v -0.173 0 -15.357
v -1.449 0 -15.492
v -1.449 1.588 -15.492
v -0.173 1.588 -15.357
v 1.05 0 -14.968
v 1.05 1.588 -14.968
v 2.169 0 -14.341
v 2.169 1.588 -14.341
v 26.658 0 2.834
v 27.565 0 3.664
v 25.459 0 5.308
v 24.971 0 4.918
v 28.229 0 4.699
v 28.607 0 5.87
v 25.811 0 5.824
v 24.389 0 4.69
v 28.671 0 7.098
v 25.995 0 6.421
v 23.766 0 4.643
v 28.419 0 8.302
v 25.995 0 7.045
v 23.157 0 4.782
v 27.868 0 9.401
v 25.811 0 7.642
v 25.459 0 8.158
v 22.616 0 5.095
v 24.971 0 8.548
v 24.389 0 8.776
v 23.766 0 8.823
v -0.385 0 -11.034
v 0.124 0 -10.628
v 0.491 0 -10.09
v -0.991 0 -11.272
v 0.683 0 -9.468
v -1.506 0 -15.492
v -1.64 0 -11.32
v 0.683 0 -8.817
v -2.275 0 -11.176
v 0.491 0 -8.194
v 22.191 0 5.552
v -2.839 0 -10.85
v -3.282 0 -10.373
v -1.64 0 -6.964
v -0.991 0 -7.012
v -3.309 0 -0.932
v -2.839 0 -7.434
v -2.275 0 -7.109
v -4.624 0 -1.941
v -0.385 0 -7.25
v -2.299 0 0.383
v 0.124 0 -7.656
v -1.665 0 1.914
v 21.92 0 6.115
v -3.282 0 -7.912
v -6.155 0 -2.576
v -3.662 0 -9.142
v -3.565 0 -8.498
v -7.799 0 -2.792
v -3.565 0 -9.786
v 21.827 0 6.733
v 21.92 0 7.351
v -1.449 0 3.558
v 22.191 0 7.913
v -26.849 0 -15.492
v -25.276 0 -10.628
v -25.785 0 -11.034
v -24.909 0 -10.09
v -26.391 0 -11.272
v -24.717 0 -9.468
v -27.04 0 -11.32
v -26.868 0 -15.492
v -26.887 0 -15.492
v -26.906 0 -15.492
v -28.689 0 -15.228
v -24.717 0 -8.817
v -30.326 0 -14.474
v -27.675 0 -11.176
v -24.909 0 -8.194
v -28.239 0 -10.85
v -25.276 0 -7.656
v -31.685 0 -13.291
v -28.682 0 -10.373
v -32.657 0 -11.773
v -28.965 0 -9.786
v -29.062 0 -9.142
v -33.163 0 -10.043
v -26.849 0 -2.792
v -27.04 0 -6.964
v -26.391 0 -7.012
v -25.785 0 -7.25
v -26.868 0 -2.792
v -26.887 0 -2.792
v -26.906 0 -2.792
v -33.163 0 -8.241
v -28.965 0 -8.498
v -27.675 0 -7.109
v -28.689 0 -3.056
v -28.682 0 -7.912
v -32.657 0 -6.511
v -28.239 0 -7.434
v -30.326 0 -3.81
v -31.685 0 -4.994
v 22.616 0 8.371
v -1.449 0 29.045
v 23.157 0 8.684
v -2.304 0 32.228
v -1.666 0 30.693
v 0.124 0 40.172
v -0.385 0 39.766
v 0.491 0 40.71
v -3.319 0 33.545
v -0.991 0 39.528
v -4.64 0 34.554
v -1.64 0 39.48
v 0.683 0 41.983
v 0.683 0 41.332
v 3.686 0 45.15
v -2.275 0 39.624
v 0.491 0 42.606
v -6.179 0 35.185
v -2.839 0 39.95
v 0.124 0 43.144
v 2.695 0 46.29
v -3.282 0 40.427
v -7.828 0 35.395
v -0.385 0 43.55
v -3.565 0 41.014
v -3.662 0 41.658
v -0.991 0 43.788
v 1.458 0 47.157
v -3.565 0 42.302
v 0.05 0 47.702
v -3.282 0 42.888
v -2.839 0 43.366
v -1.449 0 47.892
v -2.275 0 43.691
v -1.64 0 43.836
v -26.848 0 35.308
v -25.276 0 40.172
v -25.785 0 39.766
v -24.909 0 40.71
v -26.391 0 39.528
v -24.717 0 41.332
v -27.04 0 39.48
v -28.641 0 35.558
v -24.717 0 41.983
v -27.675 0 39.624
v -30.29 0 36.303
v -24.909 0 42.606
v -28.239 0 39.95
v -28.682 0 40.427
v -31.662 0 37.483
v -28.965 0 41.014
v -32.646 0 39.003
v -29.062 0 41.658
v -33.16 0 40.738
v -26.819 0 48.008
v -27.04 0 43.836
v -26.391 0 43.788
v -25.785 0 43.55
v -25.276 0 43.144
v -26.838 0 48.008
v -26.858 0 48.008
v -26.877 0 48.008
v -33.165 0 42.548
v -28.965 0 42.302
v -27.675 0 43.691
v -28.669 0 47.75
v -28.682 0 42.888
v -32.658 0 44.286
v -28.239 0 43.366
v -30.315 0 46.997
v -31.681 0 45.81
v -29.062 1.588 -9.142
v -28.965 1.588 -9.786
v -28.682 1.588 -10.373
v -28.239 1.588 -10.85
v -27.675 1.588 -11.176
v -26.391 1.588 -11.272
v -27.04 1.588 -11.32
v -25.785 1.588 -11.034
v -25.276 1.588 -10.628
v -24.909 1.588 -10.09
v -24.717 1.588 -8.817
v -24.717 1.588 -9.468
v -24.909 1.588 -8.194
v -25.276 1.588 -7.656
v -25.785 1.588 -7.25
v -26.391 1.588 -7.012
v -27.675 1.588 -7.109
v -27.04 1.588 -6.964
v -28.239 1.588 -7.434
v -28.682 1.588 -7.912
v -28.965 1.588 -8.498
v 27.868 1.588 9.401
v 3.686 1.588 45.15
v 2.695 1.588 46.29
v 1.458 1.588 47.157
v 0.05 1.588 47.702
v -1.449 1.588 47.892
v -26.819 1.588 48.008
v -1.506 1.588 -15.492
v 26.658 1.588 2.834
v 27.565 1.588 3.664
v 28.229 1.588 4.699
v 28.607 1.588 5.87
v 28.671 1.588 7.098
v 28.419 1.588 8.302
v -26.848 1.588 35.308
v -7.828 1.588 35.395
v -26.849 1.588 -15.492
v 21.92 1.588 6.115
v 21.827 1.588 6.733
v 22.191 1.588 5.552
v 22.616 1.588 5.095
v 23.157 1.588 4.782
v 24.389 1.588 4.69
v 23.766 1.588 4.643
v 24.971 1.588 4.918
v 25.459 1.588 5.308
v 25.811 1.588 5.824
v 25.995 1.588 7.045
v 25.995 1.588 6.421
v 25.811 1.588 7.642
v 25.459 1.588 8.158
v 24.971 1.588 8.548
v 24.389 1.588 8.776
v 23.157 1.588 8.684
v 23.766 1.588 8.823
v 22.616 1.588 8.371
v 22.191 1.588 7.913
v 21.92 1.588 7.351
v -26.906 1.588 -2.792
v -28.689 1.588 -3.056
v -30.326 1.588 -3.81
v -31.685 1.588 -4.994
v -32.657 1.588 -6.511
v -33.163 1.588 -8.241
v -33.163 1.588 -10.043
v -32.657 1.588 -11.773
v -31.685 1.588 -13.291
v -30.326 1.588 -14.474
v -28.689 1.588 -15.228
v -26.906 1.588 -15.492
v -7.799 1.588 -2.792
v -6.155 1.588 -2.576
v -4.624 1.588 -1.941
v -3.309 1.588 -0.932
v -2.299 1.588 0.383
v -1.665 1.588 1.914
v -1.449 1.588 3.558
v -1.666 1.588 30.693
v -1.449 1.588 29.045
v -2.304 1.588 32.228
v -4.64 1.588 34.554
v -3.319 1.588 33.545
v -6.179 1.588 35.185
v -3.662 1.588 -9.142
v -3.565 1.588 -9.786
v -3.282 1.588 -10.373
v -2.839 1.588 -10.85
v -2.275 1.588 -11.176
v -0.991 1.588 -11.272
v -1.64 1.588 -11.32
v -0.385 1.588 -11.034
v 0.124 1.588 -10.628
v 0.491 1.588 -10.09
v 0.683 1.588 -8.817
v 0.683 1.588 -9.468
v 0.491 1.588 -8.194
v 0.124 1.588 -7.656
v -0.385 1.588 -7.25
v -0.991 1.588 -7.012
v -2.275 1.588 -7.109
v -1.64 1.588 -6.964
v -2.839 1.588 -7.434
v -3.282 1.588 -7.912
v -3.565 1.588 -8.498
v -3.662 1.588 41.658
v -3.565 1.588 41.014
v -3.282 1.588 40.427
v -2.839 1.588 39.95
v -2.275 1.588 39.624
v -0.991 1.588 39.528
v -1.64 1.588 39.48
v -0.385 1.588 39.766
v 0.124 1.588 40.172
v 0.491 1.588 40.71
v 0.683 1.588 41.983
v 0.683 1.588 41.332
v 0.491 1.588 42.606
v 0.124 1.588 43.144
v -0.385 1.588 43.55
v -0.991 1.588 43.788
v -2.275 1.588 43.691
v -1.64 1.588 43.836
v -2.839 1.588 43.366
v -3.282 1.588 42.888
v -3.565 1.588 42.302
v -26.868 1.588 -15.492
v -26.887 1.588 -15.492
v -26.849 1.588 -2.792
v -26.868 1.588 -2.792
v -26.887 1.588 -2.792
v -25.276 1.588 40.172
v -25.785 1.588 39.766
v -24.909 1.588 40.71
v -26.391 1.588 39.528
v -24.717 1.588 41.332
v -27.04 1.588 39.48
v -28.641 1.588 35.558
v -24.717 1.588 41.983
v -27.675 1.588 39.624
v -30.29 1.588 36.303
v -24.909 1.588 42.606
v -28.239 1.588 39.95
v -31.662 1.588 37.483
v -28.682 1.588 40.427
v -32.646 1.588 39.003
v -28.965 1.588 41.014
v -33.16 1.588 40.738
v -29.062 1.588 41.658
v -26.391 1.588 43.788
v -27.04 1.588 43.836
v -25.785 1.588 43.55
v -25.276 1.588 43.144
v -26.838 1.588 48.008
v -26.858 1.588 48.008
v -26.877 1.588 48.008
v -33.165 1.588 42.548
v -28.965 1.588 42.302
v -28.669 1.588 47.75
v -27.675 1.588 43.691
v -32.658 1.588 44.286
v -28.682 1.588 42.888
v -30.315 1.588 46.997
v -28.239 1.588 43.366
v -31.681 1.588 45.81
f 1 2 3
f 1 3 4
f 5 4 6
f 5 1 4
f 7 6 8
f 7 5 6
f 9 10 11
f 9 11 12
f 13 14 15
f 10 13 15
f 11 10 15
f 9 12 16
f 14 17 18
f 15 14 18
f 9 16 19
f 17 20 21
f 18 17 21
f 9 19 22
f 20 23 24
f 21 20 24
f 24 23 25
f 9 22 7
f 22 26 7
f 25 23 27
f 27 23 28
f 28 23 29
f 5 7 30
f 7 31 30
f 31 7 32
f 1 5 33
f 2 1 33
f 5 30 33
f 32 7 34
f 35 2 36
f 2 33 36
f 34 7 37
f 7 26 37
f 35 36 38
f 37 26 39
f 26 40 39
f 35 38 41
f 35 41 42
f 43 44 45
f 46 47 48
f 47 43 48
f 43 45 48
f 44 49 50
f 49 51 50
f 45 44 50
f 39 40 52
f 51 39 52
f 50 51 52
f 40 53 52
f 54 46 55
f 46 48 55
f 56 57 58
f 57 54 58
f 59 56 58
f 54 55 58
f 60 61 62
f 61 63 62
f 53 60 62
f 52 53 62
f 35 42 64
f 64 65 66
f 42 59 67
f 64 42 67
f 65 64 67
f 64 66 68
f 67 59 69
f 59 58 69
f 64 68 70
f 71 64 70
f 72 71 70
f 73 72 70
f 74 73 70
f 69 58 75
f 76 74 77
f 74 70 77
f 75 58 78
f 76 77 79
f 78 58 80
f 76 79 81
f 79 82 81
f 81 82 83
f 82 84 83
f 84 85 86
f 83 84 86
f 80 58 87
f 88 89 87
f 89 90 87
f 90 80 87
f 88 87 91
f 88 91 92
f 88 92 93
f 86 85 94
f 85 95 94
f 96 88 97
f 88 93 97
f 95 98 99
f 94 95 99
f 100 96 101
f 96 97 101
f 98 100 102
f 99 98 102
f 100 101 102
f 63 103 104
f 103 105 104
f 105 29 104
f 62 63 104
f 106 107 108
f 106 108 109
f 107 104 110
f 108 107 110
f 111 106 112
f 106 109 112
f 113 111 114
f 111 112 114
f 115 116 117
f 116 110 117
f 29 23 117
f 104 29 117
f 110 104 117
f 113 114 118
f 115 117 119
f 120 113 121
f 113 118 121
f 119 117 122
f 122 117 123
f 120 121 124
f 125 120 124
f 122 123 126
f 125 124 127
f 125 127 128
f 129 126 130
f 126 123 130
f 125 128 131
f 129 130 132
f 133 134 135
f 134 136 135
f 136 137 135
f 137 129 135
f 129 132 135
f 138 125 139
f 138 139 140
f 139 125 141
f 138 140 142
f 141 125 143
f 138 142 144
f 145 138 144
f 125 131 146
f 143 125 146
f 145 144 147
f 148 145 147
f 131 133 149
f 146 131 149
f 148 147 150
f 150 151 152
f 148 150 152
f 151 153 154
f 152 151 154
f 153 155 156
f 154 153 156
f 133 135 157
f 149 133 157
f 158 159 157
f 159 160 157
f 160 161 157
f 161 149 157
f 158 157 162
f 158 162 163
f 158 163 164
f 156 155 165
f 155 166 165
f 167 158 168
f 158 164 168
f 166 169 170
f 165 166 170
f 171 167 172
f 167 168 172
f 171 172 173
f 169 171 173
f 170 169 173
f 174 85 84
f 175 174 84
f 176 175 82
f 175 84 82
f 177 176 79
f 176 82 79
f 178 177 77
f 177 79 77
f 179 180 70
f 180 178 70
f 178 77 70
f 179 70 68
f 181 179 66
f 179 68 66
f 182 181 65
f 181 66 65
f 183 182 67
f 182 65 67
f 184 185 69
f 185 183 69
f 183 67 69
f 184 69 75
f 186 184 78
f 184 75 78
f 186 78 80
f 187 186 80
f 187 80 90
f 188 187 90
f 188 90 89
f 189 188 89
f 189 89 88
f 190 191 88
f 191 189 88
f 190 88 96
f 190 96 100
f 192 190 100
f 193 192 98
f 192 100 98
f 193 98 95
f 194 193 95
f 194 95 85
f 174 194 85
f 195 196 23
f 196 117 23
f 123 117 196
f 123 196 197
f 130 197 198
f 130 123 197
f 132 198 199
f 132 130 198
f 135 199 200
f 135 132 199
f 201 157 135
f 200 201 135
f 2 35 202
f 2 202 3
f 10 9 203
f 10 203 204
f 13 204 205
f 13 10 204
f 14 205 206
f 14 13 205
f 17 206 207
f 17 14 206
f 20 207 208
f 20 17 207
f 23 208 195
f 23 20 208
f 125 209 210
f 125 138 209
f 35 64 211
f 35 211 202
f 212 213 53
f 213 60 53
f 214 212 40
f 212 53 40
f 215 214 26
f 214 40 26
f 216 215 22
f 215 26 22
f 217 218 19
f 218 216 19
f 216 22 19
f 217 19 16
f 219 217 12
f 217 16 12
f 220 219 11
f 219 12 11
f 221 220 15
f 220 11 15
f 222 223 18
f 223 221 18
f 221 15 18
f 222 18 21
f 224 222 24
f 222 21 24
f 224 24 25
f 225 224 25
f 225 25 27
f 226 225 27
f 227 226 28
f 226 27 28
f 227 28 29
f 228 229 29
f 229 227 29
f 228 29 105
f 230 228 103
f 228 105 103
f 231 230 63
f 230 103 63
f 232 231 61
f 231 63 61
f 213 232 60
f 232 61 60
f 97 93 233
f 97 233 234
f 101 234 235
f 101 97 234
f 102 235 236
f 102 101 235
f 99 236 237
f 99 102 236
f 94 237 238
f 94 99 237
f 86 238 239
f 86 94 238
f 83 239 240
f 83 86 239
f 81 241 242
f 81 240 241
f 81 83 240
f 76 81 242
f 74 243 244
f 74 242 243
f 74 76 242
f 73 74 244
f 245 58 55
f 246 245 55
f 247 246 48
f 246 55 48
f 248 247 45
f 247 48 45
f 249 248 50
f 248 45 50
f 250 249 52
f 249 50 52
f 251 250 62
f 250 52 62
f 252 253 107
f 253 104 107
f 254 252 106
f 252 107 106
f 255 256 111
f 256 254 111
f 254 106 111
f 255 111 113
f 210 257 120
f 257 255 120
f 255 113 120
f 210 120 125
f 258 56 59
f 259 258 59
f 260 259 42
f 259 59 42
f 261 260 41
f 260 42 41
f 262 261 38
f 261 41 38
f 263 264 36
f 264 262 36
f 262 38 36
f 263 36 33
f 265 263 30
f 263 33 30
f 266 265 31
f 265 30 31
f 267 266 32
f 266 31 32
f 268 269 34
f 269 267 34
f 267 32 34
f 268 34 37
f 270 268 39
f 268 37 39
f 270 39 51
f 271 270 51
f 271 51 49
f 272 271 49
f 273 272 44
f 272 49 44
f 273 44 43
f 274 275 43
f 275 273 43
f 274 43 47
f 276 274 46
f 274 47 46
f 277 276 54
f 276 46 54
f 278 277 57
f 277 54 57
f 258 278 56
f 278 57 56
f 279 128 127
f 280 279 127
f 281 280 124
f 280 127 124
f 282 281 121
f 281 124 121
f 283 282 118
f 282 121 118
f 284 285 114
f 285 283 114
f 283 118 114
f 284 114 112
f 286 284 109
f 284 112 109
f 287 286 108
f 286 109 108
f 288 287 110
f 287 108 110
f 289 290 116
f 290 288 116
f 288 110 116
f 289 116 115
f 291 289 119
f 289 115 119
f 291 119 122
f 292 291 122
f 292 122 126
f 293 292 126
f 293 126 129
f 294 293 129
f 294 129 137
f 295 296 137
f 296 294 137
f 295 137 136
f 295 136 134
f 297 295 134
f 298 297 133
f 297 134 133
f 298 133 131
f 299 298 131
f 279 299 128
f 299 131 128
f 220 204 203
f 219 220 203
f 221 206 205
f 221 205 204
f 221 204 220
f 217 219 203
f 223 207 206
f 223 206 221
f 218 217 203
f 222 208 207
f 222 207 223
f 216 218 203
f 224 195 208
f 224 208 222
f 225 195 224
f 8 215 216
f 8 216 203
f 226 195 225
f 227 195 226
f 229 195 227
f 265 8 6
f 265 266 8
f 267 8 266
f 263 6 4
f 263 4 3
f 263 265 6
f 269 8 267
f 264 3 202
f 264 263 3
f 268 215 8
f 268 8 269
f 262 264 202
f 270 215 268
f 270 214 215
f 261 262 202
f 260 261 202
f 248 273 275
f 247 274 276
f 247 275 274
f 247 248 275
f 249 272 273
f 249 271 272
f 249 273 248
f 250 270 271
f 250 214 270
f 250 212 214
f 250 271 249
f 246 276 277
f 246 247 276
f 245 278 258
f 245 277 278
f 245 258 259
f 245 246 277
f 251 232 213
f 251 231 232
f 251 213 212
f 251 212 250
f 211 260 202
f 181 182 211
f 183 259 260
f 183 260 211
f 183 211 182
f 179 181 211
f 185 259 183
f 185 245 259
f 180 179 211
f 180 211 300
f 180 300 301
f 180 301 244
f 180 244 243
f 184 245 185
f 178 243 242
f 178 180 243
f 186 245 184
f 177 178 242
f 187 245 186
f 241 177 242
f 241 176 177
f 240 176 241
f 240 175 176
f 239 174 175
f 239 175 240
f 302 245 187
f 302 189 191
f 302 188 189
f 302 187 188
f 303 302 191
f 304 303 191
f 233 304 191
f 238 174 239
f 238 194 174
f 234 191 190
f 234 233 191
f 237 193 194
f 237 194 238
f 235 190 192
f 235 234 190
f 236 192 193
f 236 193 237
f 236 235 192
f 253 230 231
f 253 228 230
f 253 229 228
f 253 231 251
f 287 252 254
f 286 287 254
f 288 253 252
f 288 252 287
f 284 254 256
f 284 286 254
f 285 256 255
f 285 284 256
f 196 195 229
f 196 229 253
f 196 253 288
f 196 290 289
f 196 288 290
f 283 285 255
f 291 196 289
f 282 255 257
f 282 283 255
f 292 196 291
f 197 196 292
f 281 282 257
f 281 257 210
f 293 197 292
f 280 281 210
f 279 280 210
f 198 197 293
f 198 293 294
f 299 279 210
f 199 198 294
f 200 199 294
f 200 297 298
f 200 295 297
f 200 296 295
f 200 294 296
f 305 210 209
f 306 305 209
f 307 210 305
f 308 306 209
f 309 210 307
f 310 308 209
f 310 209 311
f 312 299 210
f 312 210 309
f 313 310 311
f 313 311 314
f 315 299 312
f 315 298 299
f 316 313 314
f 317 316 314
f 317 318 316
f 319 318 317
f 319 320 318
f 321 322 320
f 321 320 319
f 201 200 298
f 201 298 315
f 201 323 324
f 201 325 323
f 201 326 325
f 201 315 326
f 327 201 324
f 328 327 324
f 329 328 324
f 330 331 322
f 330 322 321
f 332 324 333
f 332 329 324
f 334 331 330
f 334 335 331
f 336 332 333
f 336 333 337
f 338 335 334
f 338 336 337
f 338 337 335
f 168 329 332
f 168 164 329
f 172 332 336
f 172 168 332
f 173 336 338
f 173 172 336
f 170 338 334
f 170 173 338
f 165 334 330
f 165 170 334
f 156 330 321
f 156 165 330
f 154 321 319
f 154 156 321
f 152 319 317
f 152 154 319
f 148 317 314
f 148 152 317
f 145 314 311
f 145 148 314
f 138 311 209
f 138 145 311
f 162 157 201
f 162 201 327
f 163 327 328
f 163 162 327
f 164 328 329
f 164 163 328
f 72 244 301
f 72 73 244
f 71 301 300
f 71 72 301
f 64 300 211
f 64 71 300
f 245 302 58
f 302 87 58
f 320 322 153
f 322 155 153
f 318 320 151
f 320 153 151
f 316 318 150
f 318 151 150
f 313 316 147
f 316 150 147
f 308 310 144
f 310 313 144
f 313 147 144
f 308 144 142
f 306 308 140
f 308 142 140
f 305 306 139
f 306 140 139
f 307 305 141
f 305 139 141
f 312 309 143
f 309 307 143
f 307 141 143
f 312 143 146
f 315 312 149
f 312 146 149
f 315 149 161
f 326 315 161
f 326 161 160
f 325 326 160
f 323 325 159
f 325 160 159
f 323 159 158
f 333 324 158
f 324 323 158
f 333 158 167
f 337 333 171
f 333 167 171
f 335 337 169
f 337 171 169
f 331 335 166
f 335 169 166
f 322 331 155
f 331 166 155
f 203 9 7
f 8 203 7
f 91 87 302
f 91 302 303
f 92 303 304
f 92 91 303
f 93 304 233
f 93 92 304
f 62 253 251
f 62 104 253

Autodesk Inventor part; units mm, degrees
ref_plane "YZ Plane" through (0, 0, 0) normal (1, 0, 0) x (0, 1, 0)
ref_plane "XZ Plane" through (0, 0, 0) normal (0, 1, 0) x (-1, 0, 0)
ref_plane "XY Plane" through (0, 0, 0) normal (0, 0, 1) x (1, 0, 0)
sketch "Sketch1" plane through (0, 0, 0) normal (0, 1, 0) x (-1, 0, 0)
  circle A0 centre (1.4772, 41.6579) radius 2.1844
  circle A1 centre (26.8772, 41.6579) radius 2.1844
  circle A2 centre (26.8772, -9.1421) radius 2.1844
  circle A3 centre (1.4772, -9.1421) radius 2.1844
  arc A4 (1.4487, 47.8916) -> (-3.6864, 45.1505) centre (1.4772, 41.6579) ccw
  arc A5 (26.8481, 35.3079) -> (26.8191, 48.0076) centre (26.8772, 41.6579) ccw
  arc A6 (26.8487, -15.4921) -> (26.8487, -2.7922) centre (26.8772, -9.1421) ccw
  circle A7 centre (-23.9228, 6.7329) radius 2.0955
  arc A8 (-27.8677, 9.4012) -> (-26.6575, 2.8337) centre (-23.9228, 6.7329) ccw
  line L0 (-3.6864, 45.1505) -> (-27.8677, 9.4012)
  line L1 (-26.6575, 2.8337) -> (-2.169, -14.341)
  line L2 (26.8772, 48.0079) -> (1.4487, 47.8916)
  line L3 (26.8481, 35.3079) -> (7.8277, 35.3949)
  line L4 (1.4487, 29.045) -> (1.4487, 3.5578)
  line L5 (26.9057, -2.7922) -> (7.7987, -2.7922)
  line L6 (26.9057, -15.4921) -> (1.4487, -15.4921)
  arc A9 (1.5057, -2.7922) -> (1.4487, -2.7922) centre (1.4772, -9.1421) ccw
  arc A10 (-2.169, -14.341) -> (1.5057, -15.4921) centre (1.4772, -9.1421) ccw
  arc A11 (7.8277, 35.3949) -> (1.4487, 29.045) centre (7.7987, 29.045) ccw
  arc A12 (1.4487, 3.5578) -> (7.7987, -2.7922) centre (7.7987, 3.5578) ccw
  point P0 (0, 0)
  dimension "d0" = 4.191
  dimension "d1" = 9.525
  dimension "d2" = 25.4
  dimension "d3" = 6.35
extrude "Extrusion1" add sketch "Sketch1" along normal blind 1.5875
properties part number "gusset" material "Acetal Resin, White"
